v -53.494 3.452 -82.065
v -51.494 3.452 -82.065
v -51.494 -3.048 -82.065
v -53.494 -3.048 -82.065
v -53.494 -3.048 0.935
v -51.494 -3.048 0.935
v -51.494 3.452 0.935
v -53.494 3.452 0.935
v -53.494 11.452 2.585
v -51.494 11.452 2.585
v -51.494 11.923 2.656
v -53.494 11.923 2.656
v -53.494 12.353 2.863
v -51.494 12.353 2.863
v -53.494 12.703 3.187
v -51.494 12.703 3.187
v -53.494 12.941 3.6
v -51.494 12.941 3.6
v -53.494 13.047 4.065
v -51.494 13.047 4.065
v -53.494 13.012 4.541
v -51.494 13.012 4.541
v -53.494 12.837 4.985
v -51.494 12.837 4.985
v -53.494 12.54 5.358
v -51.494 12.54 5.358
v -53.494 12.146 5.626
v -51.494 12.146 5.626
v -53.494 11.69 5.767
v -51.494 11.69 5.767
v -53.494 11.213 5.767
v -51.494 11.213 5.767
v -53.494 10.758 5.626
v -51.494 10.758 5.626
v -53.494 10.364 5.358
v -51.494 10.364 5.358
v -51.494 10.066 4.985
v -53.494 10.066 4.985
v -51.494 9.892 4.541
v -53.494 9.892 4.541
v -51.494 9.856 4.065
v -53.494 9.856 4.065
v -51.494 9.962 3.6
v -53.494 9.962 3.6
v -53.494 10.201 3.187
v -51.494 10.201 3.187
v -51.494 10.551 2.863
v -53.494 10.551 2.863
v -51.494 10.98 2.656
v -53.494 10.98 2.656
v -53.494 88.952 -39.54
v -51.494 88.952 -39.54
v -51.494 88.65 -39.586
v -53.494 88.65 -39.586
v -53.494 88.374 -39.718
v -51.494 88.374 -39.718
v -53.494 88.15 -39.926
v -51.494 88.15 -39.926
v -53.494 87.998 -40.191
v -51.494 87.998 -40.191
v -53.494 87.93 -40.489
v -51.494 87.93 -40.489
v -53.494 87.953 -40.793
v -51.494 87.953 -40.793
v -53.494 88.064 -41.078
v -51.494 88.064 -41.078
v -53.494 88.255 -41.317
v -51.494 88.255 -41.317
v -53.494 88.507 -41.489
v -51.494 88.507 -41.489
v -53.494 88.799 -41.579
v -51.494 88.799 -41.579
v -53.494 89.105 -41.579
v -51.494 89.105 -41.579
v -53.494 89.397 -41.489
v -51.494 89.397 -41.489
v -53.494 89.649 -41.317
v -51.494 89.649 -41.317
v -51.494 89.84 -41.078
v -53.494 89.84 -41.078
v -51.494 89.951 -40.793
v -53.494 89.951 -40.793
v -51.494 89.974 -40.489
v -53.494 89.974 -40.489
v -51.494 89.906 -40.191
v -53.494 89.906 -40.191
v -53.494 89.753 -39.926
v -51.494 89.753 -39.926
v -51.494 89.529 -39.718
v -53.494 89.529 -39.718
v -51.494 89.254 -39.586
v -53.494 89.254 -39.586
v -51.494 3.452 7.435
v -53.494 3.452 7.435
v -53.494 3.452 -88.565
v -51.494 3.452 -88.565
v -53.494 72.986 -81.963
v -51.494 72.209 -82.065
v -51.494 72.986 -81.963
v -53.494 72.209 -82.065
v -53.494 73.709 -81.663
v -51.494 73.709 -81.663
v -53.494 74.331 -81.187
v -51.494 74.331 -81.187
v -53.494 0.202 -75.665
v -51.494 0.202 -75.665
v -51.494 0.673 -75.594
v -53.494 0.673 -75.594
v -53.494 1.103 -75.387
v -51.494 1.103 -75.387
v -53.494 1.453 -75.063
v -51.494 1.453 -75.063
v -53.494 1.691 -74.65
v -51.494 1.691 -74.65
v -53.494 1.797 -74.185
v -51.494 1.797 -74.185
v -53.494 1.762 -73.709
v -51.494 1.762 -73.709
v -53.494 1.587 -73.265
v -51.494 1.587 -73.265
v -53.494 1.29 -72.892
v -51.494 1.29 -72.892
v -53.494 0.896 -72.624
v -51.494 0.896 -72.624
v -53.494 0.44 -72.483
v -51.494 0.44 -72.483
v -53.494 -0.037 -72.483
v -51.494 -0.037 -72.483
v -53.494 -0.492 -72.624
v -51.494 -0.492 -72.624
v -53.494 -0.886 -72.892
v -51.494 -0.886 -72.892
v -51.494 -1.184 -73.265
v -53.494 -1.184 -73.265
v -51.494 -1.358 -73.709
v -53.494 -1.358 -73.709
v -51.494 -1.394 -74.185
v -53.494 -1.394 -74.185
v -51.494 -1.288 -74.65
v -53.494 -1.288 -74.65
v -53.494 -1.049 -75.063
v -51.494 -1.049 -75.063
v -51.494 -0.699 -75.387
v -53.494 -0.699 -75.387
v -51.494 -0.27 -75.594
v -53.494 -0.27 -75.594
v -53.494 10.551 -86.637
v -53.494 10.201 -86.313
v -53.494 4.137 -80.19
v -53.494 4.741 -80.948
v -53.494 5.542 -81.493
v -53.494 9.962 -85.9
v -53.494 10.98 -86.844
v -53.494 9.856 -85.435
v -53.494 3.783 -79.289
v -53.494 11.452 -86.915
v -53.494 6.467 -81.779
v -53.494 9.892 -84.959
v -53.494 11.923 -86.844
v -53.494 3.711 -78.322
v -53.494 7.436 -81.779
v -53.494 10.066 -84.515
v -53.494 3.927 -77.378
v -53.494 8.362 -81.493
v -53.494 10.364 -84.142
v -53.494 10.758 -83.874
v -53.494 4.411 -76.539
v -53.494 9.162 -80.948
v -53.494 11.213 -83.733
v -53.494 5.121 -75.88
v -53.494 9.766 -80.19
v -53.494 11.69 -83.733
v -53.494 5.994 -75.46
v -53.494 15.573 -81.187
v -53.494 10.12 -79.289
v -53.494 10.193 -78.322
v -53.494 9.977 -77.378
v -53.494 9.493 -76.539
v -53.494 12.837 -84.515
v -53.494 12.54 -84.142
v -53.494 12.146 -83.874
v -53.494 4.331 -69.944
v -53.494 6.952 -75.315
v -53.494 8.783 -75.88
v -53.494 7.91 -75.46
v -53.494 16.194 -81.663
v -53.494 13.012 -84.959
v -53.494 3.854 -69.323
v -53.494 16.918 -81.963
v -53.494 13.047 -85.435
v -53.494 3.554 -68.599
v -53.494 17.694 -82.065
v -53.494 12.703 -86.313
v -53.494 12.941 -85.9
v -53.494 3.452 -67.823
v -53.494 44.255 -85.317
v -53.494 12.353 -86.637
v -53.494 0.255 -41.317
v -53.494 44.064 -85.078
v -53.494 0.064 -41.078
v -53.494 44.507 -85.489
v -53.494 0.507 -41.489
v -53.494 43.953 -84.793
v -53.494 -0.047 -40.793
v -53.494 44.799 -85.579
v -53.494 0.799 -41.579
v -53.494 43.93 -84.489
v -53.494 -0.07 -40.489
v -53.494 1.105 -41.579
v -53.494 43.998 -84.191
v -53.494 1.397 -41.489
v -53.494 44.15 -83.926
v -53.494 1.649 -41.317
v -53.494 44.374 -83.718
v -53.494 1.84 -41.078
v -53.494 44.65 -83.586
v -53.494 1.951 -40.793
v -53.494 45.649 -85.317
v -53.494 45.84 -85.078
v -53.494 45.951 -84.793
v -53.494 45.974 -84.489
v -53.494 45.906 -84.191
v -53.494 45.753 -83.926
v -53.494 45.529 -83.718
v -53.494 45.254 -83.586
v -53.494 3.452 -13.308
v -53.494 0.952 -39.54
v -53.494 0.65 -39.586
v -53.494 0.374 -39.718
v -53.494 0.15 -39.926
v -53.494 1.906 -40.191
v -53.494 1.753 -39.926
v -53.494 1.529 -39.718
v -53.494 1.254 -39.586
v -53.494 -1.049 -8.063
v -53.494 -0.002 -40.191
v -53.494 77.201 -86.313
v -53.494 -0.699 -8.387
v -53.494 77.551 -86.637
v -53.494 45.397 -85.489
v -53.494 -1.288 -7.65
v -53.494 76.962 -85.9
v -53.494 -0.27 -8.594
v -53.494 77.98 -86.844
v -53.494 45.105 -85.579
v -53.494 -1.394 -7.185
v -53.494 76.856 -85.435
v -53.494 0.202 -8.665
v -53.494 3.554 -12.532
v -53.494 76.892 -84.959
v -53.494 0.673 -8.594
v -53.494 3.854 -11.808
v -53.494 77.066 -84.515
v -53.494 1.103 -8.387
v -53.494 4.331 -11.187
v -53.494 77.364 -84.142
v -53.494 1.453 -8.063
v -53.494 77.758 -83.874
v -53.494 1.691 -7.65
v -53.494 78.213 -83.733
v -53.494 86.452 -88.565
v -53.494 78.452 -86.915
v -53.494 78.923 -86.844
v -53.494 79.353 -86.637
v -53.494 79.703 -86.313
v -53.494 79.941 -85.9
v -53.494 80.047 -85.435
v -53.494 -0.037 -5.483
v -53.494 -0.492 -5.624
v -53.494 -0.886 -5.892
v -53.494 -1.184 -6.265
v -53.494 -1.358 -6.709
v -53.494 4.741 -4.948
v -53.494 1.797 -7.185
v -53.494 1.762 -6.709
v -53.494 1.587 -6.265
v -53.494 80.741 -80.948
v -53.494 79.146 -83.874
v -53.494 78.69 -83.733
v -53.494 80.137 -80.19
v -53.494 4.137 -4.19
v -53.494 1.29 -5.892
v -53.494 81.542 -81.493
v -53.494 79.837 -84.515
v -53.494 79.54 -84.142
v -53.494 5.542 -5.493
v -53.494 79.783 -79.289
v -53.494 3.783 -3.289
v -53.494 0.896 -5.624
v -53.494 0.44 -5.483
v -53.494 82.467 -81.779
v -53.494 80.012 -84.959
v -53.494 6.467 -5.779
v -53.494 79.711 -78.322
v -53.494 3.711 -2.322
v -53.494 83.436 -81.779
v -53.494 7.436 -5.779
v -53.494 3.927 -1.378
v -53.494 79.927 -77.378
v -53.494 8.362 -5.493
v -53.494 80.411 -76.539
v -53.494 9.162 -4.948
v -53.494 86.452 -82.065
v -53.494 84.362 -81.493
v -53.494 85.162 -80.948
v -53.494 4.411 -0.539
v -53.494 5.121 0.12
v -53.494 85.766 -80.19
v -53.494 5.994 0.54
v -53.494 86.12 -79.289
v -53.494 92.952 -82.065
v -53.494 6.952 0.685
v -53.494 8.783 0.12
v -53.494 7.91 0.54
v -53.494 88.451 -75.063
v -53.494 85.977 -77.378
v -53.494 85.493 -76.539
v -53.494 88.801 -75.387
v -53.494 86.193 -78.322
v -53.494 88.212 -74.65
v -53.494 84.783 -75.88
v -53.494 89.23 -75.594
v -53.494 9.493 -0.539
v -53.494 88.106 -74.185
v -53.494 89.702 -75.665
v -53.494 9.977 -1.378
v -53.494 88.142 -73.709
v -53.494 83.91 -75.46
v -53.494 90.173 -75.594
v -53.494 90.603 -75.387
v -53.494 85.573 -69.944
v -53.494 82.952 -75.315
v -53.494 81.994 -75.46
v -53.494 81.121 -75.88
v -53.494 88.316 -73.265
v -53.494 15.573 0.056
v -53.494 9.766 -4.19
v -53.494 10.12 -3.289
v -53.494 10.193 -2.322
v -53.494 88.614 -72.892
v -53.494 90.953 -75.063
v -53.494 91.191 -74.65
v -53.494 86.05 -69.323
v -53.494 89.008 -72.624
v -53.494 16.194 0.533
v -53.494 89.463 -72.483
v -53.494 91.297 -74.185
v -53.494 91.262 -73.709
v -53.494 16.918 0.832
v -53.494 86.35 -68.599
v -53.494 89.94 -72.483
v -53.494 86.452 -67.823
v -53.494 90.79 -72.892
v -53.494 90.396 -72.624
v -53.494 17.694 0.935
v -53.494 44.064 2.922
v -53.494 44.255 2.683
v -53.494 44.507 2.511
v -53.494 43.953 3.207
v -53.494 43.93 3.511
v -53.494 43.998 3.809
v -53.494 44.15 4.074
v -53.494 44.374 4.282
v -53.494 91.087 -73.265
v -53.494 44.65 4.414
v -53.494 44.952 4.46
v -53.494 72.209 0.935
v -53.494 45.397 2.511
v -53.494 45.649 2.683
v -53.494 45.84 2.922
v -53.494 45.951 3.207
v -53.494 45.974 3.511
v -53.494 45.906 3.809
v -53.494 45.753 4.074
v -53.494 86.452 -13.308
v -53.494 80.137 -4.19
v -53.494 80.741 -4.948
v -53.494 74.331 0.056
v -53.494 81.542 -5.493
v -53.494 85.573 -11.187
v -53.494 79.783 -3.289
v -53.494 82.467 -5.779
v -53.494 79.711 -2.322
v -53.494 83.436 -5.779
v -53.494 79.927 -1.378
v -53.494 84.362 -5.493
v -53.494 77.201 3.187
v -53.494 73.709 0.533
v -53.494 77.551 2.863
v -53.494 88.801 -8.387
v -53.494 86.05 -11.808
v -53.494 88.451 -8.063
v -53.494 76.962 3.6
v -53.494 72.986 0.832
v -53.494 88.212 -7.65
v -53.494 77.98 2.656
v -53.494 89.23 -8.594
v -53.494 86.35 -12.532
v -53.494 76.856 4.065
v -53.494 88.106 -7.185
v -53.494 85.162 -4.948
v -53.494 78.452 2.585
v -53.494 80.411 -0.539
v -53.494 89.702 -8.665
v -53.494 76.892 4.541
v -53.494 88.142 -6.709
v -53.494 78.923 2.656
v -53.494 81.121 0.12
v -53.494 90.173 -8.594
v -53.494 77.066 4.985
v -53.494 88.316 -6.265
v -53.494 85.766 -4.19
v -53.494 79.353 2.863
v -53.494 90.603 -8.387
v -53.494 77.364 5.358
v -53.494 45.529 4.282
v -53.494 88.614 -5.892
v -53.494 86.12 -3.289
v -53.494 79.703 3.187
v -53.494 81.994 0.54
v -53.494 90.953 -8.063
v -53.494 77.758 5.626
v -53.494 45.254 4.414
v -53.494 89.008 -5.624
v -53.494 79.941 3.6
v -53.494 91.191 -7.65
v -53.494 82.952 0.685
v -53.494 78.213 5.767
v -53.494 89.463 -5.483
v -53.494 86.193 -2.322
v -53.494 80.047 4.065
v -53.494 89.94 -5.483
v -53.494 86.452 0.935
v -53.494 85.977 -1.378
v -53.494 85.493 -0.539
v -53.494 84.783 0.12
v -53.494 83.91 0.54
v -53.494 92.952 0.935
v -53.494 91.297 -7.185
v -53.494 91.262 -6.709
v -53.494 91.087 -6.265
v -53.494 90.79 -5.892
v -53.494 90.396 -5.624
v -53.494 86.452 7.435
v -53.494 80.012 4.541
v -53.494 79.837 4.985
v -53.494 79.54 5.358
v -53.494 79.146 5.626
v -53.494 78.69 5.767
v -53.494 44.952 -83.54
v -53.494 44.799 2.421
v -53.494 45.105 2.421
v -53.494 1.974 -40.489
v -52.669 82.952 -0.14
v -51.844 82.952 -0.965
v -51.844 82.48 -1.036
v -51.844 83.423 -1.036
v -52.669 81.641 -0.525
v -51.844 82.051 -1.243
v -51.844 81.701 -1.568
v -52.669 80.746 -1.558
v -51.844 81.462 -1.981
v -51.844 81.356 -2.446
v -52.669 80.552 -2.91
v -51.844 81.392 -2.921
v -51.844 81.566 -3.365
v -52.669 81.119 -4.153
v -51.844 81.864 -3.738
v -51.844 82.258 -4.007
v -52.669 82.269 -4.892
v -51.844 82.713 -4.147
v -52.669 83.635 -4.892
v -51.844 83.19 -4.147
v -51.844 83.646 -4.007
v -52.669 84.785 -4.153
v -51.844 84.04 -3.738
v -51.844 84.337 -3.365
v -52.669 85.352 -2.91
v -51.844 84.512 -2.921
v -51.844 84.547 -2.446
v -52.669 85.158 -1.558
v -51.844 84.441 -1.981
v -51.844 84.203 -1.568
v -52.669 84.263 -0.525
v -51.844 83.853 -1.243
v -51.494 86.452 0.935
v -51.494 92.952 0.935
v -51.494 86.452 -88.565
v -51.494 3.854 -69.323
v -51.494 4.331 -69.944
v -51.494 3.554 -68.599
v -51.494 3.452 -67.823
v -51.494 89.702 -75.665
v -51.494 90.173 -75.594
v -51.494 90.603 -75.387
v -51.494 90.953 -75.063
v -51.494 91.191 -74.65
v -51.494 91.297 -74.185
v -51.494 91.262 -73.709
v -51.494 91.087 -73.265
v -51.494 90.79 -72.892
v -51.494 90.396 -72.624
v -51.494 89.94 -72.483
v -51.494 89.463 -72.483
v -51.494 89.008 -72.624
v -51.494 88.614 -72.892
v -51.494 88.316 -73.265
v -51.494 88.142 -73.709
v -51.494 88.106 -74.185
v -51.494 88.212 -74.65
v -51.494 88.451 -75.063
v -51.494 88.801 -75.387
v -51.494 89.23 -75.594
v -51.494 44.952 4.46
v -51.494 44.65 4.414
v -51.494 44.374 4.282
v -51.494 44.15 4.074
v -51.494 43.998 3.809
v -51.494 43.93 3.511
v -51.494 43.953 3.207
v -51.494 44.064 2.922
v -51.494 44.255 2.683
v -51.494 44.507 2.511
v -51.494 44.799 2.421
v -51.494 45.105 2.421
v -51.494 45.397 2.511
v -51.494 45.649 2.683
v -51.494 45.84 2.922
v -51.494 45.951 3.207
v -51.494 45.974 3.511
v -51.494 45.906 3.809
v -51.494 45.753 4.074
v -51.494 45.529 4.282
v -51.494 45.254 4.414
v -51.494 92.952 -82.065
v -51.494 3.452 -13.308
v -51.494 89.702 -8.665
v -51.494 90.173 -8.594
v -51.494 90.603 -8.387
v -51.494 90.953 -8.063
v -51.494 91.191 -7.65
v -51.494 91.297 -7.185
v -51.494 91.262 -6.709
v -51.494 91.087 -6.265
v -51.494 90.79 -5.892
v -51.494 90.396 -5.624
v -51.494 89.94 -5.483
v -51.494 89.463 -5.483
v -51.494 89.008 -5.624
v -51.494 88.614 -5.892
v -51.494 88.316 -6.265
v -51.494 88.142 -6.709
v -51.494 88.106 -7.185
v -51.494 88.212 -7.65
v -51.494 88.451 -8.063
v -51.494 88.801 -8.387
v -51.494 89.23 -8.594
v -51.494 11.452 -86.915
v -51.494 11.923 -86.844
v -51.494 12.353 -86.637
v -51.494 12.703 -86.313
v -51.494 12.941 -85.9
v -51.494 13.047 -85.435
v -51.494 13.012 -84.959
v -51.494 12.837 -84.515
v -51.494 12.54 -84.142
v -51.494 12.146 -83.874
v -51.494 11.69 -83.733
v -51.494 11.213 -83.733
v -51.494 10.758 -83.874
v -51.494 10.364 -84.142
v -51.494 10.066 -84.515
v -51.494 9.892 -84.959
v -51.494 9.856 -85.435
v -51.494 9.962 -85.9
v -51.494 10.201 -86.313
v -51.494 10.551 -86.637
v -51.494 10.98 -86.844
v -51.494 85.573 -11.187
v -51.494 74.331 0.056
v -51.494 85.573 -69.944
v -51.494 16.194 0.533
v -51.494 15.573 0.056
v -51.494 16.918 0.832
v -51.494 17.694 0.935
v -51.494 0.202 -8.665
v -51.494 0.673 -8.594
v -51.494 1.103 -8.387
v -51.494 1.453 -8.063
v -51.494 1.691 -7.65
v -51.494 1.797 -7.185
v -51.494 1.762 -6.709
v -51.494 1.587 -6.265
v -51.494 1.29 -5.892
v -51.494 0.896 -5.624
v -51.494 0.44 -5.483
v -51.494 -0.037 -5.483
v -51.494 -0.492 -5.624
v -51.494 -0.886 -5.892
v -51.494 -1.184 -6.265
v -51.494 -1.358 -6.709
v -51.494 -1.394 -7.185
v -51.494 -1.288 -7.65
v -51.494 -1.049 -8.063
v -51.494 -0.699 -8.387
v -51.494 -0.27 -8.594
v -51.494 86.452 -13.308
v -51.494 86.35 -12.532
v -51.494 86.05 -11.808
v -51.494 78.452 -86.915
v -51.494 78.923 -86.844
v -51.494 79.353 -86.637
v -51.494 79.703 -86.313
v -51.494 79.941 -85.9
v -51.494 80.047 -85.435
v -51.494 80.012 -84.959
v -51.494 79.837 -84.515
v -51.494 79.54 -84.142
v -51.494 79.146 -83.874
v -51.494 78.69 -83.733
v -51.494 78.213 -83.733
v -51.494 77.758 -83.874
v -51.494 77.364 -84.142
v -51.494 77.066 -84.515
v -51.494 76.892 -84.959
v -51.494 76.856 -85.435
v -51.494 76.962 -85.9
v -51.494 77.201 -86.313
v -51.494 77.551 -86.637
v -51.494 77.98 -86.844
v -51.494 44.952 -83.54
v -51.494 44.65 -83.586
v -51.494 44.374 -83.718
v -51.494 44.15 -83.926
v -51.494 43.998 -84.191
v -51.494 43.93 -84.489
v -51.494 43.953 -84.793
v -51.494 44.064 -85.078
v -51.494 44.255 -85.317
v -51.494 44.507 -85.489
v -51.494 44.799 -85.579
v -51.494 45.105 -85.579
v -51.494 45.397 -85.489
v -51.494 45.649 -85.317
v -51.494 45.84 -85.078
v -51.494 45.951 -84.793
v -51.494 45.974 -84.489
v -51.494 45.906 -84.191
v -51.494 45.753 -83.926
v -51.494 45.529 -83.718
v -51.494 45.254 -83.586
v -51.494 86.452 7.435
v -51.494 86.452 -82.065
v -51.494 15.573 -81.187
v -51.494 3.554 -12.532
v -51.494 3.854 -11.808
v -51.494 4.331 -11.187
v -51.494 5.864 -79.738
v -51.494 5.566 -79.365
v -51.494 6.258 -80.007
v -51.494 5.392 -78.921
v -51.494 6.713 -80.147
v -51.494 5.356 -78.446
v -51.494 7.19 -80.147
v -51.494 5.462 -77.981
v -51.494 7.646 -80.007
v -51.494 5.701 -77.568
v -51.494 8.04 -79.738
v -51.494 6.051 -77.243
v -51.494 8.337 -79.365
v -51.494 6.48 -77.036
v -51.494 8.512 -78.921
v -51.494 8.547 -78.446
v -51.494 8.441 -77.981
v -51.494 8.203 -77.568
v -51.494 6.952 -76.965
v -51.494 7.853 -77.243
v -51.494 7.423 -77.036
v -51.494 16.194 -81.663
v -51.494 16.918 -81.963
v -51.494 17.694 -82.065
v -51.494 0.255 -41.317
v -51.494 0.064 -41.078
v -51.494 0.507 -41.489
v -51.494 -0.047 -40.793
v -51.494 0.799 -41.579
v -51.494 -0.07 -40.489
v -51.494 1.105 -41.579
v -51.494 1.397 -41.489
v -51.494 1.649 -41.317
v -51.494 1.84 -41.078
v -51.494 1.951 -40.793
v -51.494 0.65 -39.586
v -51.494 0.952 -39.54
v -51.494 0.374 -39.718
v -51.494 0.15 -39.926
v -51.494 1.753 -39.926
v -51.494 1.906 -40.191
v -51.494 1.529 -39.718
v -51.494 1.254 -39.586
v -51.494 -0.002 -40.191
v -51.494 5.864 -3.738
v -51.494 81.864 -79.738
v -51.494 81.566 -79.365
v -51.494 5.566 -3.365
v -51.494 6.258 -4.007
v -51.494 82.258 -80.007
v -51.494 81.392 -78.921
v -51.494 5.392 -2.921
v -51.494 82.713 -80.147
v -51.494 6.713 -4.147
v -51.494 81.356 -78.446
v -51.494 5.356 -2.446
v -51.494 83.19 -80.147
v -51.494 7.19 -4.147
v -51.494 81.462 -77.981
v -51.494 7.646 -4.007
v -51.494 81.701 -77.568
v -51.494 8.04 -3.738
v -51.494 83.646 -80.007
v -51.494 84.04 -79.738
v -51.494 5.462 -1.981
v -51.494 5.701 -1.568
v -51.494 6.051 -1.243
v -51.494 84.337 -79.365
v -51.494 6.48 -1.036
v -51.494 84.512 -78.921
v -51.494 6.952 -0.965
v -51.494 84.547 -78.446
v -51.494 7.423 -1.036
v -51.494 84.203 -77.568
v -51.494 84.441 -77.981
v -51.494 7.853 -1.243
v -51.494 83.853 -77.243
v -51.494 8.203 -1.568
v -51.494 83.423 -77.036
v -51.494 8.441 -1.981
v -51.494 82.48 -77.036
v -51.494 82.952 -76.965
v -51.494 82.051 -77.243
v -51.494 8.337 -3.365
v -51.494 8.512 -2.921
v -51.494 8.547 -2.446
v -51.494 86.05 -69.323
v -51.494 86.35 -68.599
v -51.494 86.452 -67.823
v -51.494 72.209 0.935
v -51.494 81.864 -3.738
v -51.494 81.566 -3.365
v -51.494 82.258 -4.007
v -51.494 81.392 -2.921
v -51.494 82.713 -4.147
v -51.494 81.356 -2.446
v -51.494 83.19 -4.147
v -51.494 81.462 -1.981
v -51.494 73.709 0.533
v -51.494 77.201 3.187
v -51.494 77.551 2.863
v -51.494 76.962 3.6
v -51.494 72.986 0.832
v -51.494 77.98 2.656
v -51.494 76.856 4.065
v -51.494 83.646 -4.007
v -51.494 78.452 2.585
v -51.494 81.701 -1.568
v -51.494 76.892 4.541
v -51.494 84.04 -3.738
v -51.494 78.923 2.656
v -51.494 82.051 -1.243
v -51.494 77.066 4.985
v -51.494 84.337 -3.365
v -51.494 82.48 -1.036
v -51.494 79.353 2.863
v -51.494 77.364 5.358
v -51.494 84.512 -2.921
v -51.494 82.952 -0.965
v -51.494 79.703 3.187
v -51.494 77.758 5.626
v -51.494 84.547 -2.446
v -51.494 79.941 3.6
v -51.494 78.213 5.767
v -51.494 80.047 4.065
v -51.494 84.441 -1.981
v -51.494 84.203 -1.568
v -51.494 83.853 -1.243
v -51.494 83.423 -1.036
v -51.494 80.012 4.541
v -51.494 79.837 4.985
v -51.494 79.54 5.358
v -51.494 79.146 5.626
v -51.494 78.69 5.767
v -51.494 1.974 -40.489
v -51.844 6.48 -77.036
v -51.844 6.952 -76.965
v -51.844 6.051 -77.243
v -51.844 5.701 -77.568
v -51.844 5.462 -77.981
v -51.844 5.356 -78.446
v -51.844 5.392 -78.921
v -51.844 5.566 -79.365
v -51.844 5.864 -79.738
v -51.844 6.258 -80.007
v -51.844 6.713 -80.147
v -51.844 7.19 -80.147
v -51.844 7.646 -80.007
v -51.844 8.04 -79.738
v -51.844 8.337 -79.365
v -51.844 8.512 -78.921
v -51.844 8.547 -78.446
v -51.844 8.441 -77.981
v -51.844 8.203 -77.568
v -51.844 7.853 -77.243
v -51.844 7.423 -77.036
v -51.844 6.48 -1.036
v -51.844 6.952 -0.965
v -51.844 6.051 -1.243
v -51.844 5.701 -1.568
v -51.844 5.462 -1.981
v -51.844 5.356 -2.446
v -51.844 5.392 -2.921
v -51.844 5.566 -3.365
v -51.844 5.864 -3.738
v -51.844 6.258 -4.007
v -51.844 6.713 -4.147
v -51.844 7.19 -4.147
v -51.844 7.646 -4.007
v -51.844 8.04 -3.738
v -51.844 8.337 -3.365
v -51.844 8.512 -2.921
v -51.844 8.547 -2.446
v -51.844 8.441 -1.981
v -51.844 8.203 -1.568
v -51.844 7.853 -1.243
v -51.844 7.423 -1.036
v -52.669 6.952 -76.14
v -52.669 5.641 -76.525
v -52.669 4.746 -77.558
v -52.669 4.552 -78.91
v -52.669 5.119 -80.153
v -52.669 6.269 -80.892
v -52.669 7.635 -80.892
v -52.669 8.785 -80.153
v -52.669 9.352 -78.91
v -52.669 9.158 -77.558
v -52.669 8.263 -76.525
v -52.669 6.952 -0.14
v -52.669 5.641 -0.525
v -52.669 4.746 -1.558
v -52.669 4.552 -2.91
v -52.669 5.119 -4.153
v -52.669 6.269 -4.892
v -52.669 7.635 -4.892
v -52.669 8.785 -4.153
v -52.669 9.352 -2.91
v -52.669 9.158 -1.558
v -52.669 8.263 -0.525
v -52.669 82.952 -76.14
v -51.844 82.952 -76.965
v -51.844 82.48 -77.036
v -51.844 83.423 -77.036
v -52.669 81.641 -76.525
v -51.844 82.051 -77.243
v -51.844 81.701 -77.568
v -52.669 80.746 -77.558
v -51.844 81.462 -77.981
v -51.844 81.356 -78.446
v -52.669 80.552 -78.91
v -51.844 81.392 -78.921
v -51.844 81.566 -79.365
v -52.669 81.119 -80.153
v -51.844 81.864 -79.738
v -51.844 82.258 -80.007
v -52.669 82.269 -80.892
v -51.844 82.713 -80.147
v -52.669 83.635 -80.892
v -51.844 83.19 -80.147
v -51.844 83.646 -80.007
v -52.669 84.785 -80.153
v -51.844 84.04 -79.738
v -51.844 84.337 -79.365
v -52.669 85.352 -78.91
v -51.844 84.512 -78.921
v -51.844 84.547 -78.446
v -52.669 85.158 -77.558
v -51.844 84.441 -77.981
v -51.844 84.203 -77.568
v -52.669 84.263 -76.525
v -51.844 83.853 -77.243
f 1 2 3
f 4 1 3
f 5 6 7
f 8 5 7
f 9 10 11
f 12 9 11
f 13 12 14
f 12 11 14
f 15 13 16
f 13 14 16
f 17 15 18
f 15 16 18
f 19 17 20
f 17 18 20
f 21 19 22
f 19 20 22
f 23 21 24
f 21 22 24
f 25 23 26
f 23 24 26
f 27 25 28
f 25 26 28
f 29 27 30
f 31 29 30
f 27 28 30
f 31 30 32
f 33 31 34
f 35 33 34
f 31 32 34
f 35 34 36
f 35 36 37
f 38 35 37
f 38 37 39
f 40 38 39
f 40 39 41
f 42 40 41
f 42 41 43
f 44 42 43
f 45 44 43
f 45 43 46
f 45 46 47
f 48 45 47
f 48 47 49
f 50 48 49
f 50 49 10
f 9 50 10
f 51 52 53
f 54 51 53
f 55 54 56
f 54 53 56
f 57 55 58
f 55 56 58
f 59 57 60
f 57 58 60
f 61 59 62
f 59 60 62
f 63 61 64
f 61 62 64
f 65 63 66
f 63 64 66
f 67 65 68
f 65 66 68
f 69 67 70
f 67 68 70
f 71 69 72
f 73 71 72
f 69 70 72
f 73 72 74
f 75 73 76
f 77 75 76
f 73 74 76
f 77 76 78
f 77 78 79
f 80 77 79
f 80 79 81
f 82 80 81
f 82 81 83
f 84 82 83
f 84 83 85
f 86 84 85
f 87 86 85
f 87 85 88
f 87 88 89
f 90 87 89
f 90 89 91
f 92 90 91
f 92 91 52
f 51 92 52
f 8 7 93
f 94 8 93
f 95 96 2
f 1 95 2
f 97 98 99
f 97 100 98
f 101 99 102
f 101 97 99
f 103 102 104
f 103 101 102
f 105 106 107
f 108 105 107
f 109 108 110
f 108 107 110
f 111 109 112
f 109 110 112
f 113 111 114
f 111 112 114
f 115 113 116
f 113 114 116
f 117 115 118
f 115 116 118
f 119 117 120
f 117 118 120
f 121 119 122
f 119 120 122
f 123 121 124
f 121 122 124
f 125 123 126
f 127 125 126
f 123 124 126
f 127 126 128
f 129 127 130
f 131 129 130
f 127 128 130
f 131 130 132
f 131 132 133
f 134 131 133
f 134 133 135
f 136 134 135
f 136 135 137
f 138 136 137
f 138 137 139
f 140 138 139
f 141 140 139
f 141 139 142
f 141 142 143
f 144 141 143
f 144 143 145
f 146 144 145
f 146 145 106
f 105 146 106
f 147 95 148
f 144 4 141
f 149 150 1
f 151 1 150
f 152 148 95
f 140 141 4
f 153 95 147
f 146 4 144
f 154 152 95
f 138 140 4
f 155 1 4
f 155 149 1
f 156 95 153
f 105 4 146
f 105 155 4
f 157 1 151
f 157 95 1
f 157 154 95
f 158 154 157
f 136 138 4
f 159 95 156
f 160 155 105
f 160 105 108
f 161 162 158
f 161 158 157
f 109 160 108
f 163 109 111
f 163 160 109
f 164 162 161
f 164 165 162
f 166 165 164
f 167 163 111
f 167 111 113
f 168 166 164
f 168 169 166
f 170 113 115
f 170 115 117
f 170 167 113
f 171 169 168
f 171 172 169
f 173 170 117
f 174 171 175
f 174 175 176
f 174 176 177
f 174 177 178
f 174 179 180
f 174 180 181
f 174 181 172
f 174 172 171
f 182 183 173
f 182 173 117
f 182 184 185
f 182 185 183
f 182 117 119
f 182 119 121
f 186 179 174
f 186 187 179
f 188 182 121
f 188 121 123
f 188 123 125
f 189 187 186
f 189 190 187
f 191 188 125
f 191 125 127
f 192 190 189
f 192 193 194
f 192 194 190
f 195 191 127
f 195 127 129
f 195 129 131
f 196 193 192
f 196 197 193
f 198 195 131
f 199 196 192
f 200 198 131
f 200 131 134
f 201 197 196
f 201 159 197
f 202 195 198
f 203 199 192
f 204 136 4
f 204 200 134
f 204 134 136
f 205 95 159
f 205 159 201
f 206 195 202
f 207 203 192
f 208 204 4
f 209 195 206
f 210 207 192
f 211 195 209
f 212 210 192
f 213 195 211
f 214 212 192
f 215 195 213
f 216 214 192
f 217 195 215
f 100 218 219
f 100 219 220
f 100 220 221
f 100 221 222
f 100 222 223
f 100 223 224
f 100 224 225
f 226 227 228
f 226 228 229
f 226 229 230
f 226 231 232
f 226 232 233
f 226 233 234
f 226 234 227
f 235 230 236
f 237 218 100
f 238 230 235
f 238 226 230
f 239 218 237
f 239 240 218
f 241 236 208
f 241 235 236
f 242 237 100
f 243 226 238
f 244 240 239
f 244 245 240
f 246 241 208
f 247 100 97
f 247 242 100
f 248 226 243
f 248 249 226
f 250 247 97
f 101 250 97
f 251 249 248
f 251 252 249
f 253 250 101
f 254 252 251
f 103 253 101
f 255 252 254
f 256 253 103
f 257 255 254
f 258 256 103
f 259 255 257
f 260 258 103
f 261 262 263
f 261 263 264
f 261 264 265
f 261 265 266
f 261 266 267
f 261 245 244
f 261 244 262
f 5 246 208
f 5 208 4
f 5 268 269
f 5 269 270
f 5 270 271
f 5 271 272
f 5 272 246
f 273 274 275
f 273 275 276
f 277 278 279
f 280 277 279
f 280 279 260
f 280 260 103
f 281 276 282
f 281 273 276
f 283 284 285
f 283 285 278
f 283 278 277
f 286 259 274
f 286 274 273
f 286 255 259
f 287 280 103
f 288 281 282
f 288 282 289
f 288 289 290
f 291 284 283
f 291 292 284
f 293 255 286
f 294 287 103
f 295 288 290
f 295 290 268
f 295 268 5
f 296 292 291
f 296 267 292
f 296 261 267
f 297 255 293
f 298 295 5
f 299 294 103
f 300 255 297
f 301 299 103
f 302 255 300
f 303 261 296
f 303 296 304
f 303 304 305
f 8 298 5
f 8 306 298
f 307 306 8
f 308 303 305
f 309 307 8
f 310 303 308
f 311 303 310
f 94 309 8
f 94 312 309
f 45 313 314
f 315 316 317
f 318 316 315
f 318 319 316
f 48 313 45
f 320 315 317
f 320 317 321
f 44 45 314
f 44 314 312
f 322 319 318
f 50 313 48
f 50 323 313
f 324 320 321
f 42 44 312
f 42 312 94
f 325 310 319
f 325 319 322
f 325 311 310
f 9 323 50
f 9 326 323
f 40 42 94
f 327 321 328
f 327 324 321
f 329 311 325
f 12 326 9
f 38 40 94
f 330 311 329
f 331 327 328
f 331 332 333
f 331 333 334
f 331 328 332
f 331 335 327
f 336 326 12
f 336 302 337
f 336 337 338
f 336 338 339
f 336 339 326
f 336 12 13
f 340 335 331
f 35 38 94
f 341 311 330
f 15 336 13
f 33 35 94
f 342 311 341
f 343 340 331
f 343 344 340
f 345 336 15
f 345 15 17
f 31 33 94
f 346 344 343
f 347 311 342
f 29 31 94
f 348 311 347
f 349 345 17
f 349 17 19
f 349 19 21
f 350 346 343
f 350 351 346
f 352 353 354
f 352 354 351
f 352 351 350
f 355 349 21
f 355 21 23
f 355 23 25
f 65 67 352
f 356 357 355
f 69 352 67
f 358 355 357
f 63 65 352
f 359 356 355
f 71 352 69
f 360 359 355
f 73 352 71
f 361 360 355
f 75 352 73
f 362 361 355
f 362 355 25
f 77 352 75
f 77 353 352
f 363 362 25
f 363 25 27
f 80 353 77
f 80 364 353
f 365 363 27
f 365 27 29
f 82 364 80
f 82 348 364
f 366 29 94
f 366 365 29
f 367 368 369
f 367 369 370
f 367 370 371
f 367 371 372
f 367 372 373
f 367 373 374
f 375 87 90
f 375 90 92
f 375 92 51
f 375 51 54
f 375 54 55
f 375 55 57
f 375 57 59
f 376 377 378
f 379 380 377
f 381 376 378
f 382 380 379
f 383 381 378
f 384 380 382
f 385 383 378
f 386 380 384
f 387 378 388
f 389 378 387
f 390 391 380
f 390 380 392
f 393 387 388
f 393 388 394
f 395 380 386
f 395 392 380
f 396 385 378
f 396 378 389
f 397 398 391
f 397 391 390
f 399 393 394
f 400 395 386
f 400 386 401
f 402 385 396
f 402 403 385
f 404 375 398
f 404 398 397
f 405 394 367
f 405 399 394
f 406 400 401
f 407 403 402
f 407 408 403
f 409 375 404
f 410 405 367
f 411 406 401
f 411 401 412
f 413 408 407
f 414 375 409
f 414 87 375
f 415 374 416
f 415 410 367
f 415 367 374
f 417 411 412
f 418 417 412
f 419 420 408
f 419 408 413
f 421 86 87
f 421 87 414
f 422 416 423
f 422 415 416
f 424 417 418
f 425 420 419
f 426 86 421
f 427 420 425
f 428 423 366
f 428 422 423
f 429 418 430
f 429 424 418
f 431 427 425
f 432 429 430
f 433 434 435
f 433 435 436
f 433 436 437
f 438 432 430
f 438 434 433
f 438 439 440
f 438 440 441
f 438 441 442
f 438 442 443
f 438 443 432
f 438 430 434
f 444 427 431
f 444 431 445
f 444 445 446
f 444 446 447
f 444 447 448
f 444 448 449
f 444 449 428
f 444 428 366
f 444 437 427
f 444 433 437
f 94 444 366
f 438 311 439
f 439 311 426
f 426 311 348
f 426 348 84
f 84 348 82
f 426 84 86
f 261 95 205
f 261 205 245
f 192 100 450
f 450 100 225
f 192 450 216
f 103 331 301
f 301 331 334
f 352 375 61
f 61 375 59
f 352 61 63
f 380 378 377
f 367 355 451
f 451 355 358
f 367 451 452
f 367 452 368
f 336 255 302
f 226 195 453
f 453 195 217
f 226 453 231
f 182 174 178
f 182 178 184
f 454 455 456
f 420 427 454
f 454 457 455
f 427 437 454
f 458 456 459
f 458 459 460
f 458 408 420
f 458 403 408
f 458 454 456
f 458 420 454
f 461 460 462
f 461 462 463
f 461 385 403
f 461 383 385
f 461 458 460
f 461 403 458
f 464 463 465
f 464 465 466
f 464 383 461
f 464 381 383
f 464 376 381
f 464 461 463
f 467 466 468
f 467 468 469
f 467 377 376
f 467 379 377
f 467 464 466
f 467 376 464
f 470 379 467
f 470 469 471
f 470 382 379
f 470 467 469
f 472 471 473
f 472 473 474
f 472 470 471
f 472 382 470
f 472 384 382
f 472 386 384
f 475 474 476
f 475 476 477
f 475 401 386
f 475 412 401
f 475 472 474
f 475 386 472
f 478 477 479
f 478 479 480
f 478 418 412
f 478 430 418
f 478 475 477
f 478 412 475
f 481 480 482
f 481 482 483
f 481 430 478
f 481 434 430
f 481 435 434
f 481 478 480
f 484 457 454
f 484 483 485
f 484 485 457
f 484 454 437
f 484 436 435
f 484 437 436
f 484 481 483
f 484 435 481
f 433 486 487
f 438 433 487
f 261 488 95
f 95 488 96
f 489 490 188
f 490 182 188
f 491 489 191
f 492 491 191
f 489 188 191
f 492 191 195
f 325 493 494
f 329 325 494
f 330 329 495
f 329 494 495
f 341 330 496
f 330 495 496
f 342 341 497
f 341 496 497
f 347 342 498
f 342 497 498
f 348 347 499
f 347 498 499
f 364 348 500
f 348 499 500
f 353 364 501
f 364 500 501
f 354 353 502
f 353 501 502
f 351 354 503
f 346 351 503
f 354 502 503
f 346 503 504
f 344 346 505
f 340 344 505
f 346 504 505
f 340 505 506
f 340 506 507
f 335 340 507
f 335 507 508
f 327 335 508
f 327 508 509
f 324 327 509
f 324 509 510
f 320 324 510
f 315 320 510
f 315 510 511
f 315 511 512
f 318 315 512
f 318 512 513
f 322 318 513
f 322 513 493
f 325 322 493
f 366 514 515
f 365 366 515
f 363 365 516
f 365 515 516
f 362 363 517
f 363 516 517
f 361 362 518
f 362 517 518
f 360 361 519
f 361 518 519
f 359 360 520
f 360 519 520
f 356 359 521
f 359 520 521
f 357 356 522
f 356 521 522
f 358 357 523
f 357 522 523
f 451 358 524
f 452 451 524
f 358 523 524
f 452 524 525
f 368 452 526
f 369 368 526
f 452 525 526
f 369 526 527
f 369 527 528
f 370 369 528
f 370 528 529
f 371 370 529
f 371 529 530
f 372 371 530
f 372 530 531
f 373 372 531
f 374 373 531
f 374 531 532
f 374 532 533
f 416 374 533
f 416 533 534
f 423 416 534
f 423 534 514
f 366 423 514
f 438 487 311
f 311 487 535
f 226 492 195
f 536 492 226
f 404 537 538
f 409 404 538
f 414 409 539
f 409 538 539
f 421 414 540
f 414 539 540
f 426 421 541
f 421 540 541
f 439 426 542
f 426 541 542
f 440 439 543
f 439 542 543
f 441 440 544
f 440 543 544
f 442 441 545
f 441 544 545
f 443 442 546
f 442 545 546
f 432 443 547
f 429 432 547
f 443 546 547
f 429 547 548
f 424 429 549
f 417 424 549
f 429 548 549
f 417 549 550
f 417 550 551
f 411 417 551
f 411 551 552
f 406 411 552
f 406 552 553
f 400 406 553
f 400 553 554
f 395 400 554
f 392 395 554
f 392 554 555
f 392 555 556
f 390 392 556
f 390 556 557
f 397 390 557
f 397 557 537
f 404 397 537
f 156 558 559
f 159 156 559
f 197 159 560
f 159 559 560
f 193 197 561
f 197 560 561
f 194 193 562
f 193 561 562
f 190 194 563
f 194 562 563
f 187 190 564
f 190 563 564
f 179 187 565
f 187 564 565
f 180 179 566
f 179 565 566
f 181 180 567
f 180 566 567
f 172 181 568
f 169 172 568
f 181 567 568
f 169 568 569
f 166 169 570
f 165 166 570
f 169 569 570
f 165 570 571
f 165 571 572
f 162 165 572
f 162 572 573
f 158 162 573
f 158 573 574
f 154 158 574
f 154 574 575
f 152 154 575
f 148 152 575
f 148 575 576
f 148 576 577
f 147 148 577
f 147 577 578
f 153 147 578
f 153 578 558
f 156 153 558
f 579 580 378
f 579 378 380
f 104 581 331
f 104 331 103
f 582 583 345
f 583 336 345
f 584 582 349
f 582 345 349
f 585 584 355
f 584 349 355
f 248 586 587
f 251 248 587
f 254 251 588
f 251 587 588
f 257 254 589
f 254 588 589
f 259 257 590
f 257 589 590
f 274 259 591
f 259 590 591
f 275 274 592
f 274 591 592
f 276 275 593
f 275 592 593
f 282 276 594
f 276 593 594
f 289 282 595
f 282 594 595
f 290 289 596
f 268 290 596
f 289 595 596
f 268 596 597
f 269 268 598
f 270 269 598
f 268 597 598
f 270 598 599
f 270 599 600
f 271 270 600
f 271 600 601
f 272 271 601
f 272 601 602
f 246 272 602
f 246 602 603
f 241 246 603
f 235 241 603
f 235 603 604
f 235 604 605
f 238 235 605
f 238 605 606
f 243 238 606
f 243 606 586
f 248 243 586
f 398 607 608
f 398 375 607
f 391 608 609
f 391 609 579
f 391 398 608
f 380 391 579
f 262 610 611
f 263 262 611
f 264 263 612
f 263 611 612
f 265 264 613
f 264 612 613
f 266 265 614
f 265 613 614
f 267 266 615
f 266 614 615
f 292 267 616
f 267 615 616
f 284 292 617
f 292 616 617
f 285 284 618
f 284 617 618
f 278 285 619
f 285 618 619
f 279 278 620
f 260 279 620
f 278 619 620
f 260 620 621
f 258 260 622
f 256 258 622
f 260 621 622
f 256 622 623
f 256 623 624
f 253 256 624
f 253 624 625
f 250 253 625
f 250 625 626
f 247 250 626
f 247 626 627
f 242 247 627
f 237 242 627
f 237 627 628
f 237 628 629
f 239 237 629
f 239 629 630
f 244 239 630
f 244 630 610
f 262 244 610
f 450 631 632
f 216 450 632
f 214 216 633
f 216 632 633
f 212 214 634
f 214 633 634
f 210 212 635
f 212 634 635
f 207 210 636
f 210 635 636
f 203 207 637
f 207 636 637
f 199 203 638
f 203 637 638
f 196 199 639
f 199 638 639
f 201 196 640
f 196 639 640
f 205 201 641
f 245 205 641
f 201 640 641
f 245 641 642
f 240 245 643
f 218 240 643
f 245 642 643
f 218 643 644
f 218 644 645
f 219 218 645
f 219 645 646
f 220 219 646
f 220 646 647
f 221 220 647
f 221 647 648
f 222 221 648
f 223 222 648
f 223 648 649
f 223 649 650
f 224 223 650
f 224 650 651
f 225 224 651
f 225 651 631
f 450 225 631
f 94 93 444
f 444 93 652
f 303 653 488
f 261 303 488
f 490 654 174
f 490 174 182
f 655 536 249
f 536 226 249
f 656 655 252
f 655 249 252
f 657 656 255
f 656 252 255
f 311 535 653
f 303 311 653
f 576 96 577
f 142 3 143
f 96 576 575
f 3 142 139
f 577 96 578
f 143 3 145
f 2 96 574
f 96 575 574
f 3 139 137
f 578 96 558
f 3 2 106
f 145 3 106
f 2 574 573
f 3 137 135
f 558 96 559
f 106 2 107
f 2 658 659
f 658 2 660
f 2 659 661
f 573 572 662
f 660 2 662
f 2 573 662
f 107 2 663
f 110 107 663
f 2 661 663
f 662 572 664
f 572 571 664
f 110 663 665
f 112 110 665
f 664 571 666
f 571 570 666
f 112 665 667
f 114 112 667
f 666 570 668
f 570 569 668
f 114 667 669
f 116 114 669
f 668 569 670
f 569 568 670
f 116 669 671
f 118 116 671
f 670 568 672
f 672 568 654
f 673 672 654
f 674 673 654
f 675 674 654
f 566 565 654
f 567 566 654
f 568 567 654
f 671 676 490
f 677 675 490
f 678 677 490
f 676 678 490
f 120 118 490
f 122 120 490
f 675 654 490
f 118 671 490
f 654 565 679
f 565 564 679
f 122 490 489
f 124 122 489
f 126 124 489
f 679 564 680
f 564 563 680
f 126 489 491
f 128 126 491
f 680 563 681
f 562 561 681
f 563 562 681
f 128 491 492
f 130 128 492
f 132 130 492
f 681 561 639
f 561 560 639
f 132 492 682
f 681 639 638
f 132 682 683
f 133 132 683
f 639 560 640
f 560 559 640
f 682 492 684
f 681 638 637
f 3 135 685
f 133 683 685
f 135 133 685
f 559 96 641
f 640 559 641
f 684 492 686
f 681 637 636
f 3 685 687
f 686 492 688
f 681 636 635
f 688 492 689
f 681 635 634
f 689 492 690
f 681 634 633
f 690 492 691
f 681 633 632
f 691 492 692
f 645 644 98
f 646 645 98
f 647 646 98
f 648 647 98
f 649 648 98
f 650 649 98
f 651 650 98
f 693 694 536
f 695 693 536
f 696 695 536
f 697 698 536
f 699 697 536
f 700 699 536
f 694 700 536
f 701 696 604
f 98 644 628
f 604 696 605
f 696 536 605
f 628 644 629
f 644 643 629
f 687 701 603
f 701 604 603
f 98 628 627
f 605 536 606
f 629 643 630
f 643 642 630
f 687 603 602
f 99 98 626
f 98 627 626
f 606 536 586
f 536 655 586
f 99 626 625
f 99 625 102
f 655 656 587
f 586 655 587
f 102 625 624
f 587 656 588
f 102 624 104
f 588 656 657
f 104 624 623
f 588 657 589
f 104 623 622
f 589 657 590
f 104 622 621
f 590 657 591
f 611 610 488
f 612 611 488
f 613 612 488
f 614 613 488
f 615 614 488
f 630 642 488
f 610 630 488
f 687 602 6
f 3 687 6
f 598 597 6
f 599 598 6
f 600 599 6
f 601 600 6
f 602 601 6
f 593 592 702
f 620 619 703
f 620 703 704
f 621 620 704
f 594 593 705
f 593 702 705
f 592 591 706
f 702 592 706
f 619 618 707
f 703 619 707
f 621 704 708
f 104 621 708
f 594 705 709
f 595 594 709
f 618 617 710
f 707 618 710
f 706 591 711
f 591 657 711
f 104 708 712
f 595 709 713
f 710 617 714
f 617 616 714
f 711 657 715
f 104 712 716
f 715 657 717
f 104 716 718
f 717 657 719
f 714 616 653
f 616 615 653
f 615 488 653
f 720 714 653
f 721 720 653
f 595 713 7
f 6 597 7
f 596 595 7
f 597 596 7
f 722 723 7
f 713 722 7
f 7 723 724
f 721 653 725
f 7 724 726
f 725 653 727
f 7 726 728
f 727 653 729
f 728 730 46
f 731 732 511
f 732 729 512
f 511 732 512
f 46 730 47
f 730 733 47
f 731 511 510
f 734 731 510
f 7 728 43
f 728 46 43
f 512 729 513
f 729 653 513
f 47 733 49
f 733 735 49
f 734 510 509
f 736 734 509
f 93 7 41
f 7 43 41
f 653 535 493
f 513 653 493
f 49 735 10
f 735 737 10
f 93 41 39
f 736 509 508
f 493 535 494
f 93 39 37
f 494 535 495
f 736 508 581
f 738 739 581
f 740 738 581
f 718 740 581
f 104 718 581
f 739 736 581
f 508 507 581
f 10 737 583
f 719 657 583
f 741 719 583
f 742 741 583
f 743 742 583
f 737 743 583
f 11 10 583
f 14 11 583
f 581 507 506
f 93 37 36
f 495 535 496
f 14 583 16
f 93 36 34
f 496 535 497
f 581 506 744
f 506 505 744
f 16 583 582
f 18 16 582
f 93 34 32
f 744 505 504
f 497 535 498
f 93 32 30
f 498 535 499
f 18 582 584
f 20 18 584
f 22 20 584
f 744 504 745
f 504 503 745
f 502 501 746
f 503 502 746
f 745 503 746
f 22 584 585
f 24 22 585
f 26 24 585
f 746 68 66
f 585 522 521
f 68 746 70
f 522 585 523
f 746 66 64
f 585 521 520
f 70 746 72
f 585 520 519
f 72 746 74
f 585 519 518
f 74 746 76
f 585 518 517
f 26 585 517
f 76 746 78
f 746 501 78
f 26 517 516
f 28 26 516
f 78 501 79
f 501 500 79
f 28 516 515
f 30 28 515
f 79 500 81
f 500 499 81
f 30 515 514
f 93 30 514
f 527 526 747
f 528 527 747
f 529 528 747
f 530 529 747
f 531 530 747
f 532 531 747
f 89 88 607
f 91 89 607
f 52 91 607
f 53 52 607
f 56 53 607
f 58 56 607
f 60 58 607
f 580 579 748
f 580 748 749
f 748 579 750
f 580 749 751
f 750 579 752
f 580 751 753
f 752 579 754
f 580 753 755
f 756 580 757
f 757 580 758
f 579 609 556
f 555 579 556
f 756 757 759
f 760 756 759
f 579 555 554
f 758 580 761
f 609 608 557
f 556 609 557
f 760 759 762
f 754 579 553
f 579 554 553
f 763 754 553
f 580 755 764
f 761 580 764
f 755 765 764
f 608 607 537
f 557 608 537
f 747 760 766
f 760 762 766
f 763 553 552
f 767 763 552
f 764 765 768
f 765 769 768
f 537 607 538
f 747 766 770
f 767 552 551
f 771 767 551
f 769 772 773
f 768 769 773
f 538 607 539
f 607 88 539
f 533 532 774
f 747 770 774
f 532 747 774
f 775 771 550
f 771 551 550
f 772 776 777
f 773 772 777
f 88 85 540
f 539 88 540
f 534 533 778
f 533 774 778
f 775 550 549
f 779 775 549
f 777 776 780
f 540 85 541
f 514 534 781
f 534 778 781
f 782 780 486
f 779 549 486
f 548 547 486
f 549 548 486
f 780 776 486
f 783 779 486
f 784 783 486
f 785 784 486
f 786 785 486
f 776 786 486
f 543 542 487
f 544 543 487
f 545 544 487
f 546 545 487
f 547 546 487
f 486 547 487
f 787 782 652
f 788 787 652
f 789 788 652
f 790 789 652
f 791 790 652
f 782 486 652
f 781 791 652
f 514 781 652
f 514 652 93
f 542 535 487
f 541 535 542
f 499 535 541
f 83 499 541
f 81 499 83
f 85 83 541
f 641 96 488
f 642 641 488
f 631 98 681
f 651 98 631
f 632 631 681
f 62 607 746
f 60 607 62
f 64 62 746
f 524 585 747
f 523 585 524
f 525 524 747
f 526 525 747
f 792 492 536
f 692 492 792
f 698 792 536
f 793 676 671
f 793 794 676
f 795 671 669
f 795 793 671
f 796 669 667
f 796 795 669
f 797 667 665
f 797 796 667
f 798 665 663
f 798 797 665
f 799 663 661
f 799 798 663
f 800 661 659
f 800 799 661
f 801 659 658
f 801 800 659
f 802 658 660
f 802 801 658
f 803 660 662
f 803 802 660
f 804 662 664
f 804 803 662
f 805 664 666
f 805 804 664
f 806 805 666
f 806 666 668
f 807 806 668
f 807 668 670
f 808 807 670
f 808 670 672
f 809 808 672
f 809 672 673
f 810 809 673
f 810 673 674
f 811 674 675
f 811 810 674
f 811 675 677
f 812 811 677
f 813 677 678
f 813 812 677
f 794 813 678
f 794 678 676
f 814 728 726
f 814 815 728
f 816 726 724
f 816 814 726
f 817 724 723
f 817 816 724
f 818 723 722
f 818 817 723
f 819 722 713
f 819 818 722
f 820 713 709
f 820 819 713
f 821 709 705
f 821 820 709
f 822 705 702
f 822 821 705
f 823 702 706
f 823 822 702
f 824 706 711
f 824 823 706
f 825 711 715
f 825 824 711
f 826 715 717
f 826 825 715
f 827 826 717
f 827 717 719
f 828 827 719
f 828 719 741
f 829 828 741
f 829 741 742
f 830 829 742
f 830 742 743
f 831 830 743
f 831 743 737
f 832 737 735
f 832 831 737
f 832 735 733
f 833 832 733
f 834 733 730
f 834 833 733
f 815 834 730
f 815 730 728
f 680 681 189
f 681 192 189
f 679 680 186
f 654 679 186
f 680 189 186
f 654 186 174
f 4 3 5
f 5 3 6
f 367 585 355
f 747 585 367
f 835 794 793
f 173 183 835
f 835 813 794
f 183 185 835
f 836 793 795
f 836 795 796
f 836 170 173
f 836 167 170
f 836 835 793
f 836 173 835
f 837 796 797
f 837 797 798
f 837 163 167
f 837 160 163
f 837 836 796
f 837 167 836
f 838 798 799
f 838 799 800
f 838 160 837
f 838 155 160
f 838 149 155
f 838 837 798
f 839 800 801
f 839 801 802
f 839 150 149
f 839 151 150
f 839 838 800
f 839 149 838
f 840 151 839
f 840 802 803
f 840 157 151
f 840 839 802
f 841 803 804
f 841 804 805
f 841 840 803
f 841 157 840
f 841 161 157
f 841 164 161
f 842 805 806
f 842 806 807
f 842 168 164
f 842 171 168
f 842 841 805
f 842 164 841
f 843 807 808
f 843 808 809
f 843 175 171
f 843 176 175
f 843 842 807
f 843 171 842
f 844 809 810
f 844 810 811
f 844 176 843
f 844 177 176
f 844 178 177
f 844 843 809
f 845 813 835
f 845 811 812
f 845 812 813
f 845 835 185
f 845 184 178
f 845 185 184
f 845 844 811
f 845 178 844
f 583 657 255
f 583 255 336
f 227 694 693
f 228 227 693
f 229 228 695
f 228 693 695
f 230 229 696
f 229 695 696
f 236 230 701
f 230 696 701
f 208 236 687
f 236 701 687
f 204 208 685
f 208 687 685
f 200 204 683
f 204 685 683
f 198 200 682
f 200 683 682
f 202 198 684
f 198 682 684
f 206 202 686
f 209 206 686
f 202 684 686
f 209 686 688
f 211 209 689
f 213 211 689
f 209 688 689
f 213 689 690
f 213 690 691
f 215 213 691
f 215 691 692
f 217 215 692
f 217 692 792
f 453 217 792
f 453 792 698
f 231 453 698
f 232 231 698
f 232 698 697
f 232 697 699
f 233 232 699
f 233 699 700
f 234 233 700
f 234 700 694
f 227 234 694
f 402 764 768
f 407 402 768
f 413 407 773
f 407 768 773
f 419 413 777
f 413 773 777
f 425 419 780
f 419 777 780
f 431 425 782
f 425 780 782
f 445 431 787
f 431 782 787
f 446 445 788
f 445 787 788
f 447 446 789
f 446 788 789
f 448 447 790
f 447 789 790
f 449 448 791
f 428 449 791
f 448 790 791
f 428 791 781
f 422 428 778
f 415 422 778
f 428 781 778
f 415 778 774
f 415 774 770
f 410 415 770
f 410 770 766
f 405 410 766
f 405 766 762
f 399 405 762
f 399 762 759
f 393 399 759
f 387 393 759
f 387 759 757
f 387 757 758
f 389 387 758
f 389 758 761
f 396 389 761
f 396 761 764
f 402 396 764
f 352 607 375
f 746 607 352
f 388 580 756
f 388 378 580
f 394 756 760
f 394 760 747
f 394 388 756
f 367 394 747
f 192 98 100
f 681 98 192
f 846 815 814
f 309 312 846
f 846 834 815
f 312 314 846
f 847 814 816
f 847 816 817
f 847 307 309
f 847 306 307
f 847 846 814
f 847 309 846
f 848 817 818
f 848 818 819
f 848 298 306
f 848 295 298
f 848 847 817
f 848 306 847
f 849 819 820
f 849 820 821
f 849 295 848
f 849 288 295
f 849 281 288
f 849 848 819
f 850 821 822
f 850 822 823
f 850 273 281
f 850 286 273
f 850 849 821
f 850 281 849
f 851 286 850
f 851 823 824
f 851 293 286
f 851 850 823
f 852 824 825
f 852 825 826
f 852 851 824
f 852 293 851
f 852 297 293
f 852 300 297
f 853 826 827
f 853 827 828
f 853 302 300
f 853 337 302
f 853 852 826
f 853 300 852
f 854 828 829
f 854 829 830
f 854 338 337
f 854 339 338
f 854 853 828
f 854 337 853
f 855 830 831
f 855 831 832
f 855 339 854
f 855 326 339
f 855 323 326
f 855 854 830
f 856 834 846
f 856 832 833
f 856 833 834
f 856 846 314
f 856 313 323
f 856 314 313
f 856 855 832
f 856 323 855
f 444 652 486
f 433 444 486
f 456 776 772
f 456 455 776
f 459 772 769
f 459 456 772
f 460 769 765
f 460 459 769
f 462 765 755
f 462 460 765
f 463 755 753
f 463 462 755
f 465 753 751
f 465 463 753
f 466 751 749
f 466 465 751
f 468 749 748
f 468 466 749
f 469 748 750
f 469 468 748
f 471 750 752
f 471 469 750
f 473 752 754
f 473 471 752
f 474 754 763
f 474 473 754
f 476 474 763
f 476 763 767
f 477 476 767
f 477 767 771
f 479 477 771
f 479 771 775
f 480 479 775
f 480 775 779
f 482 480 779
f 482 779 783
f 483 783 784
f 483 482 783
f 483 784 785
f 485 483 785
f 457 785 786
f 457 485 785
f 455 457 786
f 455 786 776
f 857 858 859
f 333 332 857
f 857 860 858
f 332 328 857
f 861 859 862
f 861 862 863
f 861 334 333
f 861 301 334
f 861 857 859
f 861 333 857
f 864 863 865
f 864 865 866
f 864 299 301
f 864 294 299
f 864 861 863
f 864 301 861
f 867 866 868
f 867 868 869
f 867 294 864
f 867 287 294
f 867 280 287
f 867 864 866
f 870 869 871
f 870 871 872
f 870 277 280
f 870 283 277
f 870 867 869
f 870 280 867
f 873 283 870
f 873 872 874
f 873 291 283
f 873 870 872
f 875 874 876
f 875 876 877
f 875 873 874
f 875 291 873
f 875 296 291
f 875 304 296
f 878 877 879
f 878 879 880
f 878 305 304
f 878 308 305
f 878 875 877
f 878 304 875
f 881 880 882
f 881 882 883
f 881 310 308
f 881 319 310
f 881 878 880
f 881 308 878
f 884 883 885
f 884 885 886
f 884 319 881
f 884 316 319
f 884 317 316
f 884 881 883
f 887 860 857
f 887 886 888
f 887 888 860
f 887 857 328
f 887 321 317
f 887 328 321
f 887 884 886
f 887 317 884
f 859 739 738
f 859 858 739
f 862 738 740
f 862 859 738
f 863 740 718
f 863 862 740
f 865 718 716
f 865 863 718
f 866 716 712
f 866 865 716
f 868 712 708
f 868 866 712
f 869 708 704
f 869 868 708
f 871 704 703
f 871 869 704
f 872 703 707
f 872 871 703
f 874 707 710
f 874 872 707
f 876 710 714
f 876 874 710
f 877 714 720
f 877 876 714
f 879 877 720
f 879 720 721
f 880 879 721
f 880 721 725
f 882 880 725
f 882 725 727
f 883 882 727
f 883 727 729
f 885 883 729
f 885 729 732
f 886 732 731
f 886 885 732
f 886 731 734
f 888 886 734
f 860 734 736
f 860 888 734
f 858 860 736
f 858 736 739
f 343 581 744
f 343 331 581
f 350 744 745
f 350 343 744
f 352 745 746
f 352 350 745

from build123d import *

# Parameters (mm, degrees)
BOSS_EXTRUDE2_DEPTH                          = 2
F_3_2_3_2_DIAMETER_HOLE3_D                   = 3.2
CSK_FOR_M3_FLAT_COUNTERSUNK_HEAD_SCR_2_COUNT = 2
CSK_FOR_M3_FLAT_COUNTERSUNK_HEAD_SCR_2_PITCH = 76
CSK_FOR_M3_FLAT_COUNTERSUNK_HEAD_SCR_3_COUNT = 2
CSK_FOR_M3_FLAT_COUNTERSUNK_HEAD_SCR_3_PITCH = 107.48023074
CSK_FOR_M3_FLAT_COUNTERSUNK_HEAD_SCR_4_COUNT = 2
CSK_FOR_M3_FLAT_COUNTERSUNK_HEAD_SCR_4_PITCH = 76
M2_5X0_45_TAPPED_HOLE1_D                     = 2.05
FILLET1_R                                    = 3


with BuildPart() as part:
    # Sketch2 → Boss-Extrude2 (new body)
    with BuildSketch(Plane.ZY.offset(51.493641502)):
        Polygon((0.93465612, 3.45185693), (7.43465612, 3.45185693), (7.43465612, 86.45185693), (0.93465612, 86.45185693), (0.93465612, 92.95185693), (-82.06534388, 92.95185693), (-82.06534388, 86.45185693), (-88.56534388, 86.45185693), (-88.56534388, 3.45185693), (-82.06534388, 3.45185693), (-82.06534388, -3.04814307), (0.93465612, -3.04814307), align=None)
        Polygon((-82.06534388, 73.45185693), (-82.06534388, 16.45185693), (-69.06534388, 3.45185693), (-12.06534388, 3.45185693), (0.93465612, 16.45185693), (0.93465612, 73.45185693), (-12.06534388, 86.45185693), (-69.06534388, 86.45185693), align=None, mode=Mode.SUBTRACT)
    extrude(amount=BOSS_EXTRUDE2_DEPTH)

    # Ø3.2 (3.2) Diameter Hole3 (through all)
    with Locations(Plane.ZY.offset(53.493641502)):
        with Locations((-74.06534388, 0.20185693), (-85.31534388, 11.45185693), (-85.31534388, 78.45185693), (-74.06534388, 89.70185693), (-7.06534388, 89.70185693), (4.18465612, 78.45185693), (4.18465612, 11.45185693), (-7.06534388, 0.20185693)):
            Hole(F_3_2_3_2_DIAMETER_HOLE3_D / 2)

    # Sketch24 → CSK for M3 Flat Countersunk Head Screw5 (revolve, cut)
    with BuildSketch(Plane(origin=(-53.493641502, 6.95185693, -78.56534388), x_dir=(0, 0, 1), z_dir=(0, 1, 0))):
        Polygon((0, 0), (0, 2), (1.6, 2), (1.6, 1.65), (3.25, 0), align=None)
    csk_for_m3_flat_countersunk_head_screw5 = revolve(axis=Axis((-59.843641502, 6.95185693, -78.56534388), (1, 0, 0)), mode=Mode.SUBTRACT)

    # CSK for M3 Flat Countersunk Head Scr 2: CSK for M3 Flat Countersunk Head Screw5 ×2
    with Locations(*[(0, i * CSK_FOR_M3_FLAT_COUNTERSUNK_HEAD_SCR_2_PITCH, 0) for i in range(1, CSK_FOR_M3_FLAT_COUNTERSUNK_HEAD_SCR_2_COUNT)]):
        add(csk_for_m3_flat_countersunk_head_screw5, mode=Mode.SUBTRACT)

    # CSK for M3 Flat Countersunk Head Scr 3: CSK for M3 Flat Countersunk Head Screw5 ×2
    with Locations(*[Vector(0, 0.7071067811865478, 0.7071067811865472) * (i * CSK_FOR_M3_FLAT_COUNTERSUNK_HEAD_SCR_3_PITCH) for i in range(1, CSK_FOR_M3_FLAT_COUNTERSUNK_HEAD_SCR_3_COUNT)]):
        add(csk_for_m3_flat_countersunk_head_screw5, mode=Mode.SUBTRACT)

    # CSK for M3 Flat Countersunk Head Scr 4: CSK for M3 Flat Countersunk Head Screw5 ×2
    with Locations(*[(0, 0, i * CSK_FOR_M3_FLAT_COUNTERSUNK_HEAD_SCR_4_PITCH) for i in range(1, CSK_FOR_M3_FLAT_COUNTERSUNK_HEAD_SCR_4_COUNT)]):
        add(csk_for_m3_flat_countersunk_head_screw5, mode=Mode.SUBTRACT)

    # M2.5x0.45 Tapped Hole1 (through all)
    with Locations(Plane(origin=(-53.493641502, 88.95185693, -40.56534388), x_dir=(0, 0, -1), z_dir=(-1, 0, 0))):
        with Locations((0, 0), (44, 44), (0, 88), (-44, 44)):
            Hole(M2_5X0_45_TAPPED_HOLE1_D / 2)

    # Fillet1
    fillet1_edges = [part.edges().sort_by_distance(p)[0] for p in [
        (-52.493641502, 86.45185693, -69.06534388),
        (-52.493641502, 73.45185693, -82.06534388),
        (-52.493641502, 16.45185693, -82.06534388),
        (-52.493641502, 3.45185693, -69.06534388),
        (-52.493641502, 3.45185693, -12.06534388),
        (-52.493641502, 16.45185693, 0.93465612),
        (-52.493641502, 73.45185693, 0.93465612),
        (-52.493641502, 86.45185693, -12.06534388),
    ]]
    fillet(fillet1_edges, radius=FILLET1_R)


solid = part.part
